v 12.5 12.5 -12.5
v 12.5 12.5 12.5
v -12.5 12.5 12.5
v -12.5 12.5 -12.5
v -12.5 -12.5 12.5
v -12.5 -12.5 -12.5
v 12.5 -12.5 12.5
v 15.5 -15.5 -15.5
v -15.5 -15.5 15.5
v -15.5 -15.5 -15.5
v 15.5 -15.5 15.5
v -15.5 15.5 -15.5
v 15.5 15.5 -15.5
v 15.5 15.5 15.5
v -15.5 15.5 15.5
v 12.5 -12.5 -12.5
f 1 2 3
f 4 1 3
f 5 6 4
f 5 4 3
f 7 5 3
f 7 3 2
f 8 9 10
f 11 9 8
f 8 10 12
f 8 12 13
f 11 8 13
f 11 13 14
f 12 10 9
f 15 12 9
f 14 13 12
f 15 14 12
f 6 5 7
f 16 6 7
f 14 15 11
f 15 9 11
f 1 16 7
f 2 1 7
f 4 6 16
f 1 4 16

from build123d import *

# Parameters (mm, degrees)
F0_W     = 31
F0_H     = 31
F0_W_2   = 25
F0_H_2   = 25
F1_DEPTH = 15.5
F2_W     = 25
F2_H     = 25
F3_DEPTH = 3
F4_W     = 25
F4_H     = 25
F5_DEPTH = 3


with BuildPart() as f1:
    # F0 (on Front) → F1 (new body, symmetric)
    with BuildSketch(Plane.XZ):
        Rectangle(F0_W, F0_H)
        Rectangle(F0_W_2, F0_H_2, mode=Mode.SUBTRACT)
    extrude(amount=F1_DEPTH, both=True)

    # F2 (on face) → F3 (join)
    with BuildSketch(Plane.XZ.offset(15.5)):
        Rectangle(F2_W, F2_H)
    extrude(amount=-F3_DEPTH)

    # F4 (on face) → F5 (join)
    with BuildSketch(Plane(origin=(0, 15.5, 0), x_dir=(-1, 0, 0), z_dir=(0, 1, 0))):
        Rectangle(F4_W, F4_H)
    extrude(amount=-F5_DEPTH)


solid = f1.part
